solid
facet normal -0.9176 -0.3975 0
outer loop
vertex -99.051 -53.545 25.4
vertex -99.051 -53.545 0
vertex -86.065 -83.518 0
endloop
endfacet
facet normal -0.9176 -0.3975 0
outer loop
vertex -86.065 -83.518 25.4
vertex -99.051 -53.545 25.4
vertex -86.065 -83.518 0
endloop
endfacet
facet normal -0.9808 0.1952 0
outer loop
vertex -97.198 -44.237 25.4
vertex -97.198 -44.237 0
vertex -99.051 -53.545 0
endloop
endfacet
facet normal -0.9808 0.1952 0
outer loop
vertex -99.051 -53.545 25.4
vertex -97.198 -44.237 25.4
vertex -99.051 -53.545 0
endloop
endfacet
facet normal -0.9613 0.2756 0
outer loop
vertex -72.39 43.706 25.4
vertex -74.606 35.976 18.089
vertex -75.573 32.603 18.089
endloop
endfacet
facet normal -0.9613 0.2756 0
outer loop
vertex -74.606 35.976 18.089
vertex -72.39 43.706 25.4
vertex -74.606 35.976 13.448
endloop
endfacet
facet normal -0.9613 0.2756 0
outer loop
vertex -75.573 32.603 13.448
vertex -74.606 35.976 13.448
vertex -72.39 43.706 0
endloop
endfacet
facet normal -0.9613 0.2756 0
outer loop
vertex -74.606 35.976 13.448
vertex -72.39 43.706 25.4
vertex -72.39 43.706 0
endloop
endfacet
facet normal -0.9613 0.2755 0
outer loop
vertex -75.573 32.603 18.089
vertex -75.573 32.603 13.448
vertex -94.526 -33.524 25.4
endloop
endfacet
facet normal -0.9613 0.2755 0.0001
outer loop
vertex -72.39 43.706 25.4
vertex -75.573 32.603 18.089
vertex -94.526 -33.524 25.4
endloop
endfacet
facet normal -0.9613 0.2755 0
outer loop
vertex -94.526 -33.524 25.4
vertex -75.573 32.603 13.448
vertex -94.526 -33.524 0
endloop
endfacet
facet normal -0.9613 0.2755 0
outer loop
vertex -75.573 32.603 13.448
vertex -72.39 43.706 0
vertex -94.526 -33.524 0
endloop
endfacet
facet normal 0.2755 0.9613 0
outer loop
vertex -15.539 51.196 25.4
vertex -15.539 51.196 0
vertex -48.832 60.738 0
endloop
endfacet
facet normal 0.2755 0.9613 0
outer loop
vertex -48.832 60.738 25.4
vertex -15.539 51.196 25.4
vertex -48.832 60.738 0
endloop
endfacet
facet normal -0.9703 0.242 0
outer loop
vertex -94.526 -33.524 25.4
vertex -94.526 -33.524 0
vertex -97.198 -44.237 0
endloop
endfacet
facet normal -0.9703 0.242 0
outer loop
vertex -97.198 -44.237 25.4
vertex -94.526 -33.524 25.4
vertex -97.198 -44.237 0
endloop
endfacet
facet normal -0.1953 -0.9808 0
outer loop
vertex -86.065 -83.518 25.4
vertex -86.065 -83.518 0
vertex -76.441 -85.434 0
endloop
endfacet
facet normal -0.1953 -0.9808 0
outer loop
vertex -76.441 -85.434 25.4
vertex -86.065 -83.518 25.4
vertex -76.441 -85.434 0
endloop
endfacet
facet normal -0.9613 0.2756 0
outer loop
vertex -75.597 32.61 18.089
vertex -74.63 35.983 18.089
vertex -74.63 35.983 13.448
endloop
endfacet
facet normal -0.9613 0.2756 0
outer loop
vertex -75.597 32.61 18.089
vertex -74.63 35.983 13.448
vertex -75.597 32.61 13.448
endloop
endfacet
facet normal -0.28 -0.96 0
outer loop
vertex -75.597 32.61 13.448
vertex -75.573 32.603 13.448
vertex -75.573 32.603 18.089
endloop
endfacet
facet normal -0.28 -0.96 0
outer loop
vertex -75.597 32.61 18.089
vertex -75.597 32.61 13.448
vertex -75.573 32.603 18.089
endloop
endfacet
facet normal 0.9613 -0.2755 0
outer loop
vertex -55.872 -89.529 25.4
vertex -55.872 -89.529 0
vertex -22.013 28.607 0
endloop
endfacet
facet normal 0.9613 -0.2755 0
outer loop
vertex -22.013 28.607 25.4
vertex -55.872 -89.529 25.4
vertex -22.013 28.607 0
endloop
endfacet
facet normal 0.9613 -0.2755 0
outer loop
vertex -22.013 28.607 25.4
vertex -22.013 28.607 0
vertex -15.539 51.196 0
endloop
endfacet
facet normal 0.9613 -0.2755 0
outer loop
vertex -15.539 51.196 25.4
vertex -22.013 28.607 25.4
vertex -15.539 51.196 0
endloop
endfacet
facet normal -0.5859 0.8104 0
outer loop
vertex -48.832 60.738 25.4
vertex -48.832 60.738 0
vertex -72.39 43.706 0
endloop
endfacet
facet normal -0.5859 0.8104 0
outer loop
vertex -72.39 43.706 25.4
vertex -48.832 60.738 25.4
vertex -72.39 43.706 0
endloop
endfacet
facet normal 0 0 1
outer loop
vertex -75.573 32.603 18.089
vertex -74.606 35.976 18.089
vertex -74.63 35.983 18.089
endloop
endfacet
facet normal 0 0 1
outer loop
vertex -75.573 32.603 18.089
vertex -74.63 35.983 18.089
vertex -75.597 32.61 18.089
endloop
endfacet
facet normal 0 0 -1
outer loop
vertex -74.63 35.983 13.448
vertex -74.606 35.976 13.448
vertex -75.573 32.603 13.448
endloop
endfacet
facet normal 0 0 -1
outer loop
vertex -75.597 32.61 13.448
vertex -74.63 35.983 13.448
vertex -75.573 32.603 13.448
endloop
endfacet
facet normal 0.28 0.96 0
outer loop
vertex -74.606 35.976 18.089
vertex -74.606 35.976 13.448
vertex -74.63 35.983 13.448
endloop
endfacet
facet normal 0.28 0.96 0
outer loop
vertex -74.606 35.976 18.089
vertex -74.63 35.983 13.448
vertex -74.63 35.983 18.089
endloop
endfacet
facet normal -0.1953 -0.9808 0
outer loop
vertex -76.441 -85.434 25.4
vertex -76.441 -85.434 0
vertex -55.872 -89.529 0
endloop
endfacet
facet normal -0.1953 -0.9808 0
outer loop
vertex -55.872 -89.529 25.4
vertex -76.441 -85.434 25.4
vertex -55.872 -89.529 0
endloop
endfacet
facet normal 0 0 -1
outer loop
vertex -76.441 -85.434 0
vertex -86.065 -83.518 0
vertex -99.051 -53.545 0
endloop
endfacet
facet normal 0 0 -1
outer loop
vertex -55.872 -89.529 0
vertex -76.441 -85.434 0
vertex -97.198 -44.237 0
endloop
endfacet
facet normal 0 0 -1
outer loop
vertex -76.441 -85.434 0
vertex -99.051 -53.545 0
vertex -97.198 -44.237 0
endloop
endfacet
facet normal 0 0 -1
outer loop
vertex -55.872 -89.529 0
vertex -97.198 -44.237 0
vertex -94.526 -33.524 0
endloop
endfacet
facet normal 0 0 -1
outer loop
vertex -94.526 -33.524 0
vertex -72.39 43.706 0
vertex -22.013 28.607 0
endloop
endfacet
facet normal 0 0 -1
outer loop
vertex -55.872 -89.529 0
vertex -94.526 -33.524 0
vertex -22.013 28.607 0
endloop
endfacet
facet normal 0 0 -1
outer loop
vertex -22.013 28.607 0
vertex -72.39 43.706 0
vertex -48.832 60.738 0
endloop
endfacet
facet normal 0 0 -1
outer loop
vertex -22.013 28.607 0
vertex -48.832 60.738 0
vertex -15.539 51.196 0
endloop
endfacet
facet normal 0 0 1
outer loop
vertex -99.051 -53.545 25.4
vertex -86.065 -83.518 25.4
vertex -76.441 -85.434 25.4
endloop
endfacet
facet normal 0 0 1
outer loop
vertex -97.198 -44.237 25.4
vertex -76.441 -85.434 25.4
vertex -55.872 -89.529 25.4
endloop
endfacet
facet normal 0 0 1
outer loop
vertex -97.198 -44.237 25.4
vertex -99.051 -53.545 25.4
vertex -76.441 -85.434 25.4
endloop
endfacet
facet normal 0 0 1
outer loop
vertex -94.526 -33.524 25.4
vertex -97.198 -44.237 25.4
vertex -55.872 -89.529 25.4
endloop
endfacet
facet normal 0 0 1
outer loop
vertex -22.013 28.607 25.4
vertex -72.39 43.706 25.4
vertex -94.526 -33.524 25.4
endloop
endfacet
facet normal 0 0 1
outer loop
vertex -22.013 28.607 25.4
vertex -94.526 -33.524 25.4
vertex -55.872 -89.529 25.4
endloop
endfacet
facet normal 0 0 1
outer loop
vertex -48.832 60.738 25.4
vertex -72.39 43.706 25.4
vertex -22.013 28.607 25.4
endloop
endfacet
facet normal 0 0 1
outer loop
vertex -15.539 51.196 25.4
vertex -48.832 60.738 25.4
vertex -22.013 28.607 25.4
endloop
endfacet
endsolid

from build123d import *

# Parameters (mm, degrees)
F1_DEPTH = 25.4
F2_W     = 3.5091163591
F2_H     = 4.6407710761
F3_DEPTH = 0.0254


with BuildPart() as f1:
    # F0 (on Top) → F1 (new body)
    with BuildSketch(Plane.XY):
        Polygon((-15.5386179686, 51.1961877346), (-48.8319955766, 60.7384853065), (-49.6143862535, 57.6021264383), (-76.441437006, -49.9391071498), (-86.0654970387, -83.5177565662), (-76.441437006, -85.4337778982), (-55.8721683804, -89.5288435292), (-38.5488659292, -29.0872941455), (-22.0129852453, 28.6069158224), align=None)
        Polygon((-49.6143862535, 57.6021264383), (-48.8319955766, 60.7384853065), (-72.3904520273, 43.7064096332), (-94.5257858226, -33.524469091), (-97.1982382925, -44.2374929704), (-93.384412075, -57.6940258869), (-86.0654970387, -83.5177565662), (-76.441437006, -49.9391071498), align=None)
        Polygon((-99.0511800836, -53.5447082589), (-86.0654970387, -83.5177565662), (-93.384412075, -57.6940258869), (-97.1982382925, -44.2374929704), align=None)
    extrude(amount=F1_DEPTH)

    # F2 (on face) → F3 (join)
    with BuildSketch(Plane(origin=(-78.4711106248, 22.4907997378, 0), x_dir=(-0.2755193001, -0.96129554, 0), z_dir=(-0.96129554, 0.2755193001, 0))):
        with Locations((-12.2740664519, 15.7686183229)):
            Rectangle(F2_W, F2_H)
    extrude(amount=F3_DEPTH)


solid = f1.part
